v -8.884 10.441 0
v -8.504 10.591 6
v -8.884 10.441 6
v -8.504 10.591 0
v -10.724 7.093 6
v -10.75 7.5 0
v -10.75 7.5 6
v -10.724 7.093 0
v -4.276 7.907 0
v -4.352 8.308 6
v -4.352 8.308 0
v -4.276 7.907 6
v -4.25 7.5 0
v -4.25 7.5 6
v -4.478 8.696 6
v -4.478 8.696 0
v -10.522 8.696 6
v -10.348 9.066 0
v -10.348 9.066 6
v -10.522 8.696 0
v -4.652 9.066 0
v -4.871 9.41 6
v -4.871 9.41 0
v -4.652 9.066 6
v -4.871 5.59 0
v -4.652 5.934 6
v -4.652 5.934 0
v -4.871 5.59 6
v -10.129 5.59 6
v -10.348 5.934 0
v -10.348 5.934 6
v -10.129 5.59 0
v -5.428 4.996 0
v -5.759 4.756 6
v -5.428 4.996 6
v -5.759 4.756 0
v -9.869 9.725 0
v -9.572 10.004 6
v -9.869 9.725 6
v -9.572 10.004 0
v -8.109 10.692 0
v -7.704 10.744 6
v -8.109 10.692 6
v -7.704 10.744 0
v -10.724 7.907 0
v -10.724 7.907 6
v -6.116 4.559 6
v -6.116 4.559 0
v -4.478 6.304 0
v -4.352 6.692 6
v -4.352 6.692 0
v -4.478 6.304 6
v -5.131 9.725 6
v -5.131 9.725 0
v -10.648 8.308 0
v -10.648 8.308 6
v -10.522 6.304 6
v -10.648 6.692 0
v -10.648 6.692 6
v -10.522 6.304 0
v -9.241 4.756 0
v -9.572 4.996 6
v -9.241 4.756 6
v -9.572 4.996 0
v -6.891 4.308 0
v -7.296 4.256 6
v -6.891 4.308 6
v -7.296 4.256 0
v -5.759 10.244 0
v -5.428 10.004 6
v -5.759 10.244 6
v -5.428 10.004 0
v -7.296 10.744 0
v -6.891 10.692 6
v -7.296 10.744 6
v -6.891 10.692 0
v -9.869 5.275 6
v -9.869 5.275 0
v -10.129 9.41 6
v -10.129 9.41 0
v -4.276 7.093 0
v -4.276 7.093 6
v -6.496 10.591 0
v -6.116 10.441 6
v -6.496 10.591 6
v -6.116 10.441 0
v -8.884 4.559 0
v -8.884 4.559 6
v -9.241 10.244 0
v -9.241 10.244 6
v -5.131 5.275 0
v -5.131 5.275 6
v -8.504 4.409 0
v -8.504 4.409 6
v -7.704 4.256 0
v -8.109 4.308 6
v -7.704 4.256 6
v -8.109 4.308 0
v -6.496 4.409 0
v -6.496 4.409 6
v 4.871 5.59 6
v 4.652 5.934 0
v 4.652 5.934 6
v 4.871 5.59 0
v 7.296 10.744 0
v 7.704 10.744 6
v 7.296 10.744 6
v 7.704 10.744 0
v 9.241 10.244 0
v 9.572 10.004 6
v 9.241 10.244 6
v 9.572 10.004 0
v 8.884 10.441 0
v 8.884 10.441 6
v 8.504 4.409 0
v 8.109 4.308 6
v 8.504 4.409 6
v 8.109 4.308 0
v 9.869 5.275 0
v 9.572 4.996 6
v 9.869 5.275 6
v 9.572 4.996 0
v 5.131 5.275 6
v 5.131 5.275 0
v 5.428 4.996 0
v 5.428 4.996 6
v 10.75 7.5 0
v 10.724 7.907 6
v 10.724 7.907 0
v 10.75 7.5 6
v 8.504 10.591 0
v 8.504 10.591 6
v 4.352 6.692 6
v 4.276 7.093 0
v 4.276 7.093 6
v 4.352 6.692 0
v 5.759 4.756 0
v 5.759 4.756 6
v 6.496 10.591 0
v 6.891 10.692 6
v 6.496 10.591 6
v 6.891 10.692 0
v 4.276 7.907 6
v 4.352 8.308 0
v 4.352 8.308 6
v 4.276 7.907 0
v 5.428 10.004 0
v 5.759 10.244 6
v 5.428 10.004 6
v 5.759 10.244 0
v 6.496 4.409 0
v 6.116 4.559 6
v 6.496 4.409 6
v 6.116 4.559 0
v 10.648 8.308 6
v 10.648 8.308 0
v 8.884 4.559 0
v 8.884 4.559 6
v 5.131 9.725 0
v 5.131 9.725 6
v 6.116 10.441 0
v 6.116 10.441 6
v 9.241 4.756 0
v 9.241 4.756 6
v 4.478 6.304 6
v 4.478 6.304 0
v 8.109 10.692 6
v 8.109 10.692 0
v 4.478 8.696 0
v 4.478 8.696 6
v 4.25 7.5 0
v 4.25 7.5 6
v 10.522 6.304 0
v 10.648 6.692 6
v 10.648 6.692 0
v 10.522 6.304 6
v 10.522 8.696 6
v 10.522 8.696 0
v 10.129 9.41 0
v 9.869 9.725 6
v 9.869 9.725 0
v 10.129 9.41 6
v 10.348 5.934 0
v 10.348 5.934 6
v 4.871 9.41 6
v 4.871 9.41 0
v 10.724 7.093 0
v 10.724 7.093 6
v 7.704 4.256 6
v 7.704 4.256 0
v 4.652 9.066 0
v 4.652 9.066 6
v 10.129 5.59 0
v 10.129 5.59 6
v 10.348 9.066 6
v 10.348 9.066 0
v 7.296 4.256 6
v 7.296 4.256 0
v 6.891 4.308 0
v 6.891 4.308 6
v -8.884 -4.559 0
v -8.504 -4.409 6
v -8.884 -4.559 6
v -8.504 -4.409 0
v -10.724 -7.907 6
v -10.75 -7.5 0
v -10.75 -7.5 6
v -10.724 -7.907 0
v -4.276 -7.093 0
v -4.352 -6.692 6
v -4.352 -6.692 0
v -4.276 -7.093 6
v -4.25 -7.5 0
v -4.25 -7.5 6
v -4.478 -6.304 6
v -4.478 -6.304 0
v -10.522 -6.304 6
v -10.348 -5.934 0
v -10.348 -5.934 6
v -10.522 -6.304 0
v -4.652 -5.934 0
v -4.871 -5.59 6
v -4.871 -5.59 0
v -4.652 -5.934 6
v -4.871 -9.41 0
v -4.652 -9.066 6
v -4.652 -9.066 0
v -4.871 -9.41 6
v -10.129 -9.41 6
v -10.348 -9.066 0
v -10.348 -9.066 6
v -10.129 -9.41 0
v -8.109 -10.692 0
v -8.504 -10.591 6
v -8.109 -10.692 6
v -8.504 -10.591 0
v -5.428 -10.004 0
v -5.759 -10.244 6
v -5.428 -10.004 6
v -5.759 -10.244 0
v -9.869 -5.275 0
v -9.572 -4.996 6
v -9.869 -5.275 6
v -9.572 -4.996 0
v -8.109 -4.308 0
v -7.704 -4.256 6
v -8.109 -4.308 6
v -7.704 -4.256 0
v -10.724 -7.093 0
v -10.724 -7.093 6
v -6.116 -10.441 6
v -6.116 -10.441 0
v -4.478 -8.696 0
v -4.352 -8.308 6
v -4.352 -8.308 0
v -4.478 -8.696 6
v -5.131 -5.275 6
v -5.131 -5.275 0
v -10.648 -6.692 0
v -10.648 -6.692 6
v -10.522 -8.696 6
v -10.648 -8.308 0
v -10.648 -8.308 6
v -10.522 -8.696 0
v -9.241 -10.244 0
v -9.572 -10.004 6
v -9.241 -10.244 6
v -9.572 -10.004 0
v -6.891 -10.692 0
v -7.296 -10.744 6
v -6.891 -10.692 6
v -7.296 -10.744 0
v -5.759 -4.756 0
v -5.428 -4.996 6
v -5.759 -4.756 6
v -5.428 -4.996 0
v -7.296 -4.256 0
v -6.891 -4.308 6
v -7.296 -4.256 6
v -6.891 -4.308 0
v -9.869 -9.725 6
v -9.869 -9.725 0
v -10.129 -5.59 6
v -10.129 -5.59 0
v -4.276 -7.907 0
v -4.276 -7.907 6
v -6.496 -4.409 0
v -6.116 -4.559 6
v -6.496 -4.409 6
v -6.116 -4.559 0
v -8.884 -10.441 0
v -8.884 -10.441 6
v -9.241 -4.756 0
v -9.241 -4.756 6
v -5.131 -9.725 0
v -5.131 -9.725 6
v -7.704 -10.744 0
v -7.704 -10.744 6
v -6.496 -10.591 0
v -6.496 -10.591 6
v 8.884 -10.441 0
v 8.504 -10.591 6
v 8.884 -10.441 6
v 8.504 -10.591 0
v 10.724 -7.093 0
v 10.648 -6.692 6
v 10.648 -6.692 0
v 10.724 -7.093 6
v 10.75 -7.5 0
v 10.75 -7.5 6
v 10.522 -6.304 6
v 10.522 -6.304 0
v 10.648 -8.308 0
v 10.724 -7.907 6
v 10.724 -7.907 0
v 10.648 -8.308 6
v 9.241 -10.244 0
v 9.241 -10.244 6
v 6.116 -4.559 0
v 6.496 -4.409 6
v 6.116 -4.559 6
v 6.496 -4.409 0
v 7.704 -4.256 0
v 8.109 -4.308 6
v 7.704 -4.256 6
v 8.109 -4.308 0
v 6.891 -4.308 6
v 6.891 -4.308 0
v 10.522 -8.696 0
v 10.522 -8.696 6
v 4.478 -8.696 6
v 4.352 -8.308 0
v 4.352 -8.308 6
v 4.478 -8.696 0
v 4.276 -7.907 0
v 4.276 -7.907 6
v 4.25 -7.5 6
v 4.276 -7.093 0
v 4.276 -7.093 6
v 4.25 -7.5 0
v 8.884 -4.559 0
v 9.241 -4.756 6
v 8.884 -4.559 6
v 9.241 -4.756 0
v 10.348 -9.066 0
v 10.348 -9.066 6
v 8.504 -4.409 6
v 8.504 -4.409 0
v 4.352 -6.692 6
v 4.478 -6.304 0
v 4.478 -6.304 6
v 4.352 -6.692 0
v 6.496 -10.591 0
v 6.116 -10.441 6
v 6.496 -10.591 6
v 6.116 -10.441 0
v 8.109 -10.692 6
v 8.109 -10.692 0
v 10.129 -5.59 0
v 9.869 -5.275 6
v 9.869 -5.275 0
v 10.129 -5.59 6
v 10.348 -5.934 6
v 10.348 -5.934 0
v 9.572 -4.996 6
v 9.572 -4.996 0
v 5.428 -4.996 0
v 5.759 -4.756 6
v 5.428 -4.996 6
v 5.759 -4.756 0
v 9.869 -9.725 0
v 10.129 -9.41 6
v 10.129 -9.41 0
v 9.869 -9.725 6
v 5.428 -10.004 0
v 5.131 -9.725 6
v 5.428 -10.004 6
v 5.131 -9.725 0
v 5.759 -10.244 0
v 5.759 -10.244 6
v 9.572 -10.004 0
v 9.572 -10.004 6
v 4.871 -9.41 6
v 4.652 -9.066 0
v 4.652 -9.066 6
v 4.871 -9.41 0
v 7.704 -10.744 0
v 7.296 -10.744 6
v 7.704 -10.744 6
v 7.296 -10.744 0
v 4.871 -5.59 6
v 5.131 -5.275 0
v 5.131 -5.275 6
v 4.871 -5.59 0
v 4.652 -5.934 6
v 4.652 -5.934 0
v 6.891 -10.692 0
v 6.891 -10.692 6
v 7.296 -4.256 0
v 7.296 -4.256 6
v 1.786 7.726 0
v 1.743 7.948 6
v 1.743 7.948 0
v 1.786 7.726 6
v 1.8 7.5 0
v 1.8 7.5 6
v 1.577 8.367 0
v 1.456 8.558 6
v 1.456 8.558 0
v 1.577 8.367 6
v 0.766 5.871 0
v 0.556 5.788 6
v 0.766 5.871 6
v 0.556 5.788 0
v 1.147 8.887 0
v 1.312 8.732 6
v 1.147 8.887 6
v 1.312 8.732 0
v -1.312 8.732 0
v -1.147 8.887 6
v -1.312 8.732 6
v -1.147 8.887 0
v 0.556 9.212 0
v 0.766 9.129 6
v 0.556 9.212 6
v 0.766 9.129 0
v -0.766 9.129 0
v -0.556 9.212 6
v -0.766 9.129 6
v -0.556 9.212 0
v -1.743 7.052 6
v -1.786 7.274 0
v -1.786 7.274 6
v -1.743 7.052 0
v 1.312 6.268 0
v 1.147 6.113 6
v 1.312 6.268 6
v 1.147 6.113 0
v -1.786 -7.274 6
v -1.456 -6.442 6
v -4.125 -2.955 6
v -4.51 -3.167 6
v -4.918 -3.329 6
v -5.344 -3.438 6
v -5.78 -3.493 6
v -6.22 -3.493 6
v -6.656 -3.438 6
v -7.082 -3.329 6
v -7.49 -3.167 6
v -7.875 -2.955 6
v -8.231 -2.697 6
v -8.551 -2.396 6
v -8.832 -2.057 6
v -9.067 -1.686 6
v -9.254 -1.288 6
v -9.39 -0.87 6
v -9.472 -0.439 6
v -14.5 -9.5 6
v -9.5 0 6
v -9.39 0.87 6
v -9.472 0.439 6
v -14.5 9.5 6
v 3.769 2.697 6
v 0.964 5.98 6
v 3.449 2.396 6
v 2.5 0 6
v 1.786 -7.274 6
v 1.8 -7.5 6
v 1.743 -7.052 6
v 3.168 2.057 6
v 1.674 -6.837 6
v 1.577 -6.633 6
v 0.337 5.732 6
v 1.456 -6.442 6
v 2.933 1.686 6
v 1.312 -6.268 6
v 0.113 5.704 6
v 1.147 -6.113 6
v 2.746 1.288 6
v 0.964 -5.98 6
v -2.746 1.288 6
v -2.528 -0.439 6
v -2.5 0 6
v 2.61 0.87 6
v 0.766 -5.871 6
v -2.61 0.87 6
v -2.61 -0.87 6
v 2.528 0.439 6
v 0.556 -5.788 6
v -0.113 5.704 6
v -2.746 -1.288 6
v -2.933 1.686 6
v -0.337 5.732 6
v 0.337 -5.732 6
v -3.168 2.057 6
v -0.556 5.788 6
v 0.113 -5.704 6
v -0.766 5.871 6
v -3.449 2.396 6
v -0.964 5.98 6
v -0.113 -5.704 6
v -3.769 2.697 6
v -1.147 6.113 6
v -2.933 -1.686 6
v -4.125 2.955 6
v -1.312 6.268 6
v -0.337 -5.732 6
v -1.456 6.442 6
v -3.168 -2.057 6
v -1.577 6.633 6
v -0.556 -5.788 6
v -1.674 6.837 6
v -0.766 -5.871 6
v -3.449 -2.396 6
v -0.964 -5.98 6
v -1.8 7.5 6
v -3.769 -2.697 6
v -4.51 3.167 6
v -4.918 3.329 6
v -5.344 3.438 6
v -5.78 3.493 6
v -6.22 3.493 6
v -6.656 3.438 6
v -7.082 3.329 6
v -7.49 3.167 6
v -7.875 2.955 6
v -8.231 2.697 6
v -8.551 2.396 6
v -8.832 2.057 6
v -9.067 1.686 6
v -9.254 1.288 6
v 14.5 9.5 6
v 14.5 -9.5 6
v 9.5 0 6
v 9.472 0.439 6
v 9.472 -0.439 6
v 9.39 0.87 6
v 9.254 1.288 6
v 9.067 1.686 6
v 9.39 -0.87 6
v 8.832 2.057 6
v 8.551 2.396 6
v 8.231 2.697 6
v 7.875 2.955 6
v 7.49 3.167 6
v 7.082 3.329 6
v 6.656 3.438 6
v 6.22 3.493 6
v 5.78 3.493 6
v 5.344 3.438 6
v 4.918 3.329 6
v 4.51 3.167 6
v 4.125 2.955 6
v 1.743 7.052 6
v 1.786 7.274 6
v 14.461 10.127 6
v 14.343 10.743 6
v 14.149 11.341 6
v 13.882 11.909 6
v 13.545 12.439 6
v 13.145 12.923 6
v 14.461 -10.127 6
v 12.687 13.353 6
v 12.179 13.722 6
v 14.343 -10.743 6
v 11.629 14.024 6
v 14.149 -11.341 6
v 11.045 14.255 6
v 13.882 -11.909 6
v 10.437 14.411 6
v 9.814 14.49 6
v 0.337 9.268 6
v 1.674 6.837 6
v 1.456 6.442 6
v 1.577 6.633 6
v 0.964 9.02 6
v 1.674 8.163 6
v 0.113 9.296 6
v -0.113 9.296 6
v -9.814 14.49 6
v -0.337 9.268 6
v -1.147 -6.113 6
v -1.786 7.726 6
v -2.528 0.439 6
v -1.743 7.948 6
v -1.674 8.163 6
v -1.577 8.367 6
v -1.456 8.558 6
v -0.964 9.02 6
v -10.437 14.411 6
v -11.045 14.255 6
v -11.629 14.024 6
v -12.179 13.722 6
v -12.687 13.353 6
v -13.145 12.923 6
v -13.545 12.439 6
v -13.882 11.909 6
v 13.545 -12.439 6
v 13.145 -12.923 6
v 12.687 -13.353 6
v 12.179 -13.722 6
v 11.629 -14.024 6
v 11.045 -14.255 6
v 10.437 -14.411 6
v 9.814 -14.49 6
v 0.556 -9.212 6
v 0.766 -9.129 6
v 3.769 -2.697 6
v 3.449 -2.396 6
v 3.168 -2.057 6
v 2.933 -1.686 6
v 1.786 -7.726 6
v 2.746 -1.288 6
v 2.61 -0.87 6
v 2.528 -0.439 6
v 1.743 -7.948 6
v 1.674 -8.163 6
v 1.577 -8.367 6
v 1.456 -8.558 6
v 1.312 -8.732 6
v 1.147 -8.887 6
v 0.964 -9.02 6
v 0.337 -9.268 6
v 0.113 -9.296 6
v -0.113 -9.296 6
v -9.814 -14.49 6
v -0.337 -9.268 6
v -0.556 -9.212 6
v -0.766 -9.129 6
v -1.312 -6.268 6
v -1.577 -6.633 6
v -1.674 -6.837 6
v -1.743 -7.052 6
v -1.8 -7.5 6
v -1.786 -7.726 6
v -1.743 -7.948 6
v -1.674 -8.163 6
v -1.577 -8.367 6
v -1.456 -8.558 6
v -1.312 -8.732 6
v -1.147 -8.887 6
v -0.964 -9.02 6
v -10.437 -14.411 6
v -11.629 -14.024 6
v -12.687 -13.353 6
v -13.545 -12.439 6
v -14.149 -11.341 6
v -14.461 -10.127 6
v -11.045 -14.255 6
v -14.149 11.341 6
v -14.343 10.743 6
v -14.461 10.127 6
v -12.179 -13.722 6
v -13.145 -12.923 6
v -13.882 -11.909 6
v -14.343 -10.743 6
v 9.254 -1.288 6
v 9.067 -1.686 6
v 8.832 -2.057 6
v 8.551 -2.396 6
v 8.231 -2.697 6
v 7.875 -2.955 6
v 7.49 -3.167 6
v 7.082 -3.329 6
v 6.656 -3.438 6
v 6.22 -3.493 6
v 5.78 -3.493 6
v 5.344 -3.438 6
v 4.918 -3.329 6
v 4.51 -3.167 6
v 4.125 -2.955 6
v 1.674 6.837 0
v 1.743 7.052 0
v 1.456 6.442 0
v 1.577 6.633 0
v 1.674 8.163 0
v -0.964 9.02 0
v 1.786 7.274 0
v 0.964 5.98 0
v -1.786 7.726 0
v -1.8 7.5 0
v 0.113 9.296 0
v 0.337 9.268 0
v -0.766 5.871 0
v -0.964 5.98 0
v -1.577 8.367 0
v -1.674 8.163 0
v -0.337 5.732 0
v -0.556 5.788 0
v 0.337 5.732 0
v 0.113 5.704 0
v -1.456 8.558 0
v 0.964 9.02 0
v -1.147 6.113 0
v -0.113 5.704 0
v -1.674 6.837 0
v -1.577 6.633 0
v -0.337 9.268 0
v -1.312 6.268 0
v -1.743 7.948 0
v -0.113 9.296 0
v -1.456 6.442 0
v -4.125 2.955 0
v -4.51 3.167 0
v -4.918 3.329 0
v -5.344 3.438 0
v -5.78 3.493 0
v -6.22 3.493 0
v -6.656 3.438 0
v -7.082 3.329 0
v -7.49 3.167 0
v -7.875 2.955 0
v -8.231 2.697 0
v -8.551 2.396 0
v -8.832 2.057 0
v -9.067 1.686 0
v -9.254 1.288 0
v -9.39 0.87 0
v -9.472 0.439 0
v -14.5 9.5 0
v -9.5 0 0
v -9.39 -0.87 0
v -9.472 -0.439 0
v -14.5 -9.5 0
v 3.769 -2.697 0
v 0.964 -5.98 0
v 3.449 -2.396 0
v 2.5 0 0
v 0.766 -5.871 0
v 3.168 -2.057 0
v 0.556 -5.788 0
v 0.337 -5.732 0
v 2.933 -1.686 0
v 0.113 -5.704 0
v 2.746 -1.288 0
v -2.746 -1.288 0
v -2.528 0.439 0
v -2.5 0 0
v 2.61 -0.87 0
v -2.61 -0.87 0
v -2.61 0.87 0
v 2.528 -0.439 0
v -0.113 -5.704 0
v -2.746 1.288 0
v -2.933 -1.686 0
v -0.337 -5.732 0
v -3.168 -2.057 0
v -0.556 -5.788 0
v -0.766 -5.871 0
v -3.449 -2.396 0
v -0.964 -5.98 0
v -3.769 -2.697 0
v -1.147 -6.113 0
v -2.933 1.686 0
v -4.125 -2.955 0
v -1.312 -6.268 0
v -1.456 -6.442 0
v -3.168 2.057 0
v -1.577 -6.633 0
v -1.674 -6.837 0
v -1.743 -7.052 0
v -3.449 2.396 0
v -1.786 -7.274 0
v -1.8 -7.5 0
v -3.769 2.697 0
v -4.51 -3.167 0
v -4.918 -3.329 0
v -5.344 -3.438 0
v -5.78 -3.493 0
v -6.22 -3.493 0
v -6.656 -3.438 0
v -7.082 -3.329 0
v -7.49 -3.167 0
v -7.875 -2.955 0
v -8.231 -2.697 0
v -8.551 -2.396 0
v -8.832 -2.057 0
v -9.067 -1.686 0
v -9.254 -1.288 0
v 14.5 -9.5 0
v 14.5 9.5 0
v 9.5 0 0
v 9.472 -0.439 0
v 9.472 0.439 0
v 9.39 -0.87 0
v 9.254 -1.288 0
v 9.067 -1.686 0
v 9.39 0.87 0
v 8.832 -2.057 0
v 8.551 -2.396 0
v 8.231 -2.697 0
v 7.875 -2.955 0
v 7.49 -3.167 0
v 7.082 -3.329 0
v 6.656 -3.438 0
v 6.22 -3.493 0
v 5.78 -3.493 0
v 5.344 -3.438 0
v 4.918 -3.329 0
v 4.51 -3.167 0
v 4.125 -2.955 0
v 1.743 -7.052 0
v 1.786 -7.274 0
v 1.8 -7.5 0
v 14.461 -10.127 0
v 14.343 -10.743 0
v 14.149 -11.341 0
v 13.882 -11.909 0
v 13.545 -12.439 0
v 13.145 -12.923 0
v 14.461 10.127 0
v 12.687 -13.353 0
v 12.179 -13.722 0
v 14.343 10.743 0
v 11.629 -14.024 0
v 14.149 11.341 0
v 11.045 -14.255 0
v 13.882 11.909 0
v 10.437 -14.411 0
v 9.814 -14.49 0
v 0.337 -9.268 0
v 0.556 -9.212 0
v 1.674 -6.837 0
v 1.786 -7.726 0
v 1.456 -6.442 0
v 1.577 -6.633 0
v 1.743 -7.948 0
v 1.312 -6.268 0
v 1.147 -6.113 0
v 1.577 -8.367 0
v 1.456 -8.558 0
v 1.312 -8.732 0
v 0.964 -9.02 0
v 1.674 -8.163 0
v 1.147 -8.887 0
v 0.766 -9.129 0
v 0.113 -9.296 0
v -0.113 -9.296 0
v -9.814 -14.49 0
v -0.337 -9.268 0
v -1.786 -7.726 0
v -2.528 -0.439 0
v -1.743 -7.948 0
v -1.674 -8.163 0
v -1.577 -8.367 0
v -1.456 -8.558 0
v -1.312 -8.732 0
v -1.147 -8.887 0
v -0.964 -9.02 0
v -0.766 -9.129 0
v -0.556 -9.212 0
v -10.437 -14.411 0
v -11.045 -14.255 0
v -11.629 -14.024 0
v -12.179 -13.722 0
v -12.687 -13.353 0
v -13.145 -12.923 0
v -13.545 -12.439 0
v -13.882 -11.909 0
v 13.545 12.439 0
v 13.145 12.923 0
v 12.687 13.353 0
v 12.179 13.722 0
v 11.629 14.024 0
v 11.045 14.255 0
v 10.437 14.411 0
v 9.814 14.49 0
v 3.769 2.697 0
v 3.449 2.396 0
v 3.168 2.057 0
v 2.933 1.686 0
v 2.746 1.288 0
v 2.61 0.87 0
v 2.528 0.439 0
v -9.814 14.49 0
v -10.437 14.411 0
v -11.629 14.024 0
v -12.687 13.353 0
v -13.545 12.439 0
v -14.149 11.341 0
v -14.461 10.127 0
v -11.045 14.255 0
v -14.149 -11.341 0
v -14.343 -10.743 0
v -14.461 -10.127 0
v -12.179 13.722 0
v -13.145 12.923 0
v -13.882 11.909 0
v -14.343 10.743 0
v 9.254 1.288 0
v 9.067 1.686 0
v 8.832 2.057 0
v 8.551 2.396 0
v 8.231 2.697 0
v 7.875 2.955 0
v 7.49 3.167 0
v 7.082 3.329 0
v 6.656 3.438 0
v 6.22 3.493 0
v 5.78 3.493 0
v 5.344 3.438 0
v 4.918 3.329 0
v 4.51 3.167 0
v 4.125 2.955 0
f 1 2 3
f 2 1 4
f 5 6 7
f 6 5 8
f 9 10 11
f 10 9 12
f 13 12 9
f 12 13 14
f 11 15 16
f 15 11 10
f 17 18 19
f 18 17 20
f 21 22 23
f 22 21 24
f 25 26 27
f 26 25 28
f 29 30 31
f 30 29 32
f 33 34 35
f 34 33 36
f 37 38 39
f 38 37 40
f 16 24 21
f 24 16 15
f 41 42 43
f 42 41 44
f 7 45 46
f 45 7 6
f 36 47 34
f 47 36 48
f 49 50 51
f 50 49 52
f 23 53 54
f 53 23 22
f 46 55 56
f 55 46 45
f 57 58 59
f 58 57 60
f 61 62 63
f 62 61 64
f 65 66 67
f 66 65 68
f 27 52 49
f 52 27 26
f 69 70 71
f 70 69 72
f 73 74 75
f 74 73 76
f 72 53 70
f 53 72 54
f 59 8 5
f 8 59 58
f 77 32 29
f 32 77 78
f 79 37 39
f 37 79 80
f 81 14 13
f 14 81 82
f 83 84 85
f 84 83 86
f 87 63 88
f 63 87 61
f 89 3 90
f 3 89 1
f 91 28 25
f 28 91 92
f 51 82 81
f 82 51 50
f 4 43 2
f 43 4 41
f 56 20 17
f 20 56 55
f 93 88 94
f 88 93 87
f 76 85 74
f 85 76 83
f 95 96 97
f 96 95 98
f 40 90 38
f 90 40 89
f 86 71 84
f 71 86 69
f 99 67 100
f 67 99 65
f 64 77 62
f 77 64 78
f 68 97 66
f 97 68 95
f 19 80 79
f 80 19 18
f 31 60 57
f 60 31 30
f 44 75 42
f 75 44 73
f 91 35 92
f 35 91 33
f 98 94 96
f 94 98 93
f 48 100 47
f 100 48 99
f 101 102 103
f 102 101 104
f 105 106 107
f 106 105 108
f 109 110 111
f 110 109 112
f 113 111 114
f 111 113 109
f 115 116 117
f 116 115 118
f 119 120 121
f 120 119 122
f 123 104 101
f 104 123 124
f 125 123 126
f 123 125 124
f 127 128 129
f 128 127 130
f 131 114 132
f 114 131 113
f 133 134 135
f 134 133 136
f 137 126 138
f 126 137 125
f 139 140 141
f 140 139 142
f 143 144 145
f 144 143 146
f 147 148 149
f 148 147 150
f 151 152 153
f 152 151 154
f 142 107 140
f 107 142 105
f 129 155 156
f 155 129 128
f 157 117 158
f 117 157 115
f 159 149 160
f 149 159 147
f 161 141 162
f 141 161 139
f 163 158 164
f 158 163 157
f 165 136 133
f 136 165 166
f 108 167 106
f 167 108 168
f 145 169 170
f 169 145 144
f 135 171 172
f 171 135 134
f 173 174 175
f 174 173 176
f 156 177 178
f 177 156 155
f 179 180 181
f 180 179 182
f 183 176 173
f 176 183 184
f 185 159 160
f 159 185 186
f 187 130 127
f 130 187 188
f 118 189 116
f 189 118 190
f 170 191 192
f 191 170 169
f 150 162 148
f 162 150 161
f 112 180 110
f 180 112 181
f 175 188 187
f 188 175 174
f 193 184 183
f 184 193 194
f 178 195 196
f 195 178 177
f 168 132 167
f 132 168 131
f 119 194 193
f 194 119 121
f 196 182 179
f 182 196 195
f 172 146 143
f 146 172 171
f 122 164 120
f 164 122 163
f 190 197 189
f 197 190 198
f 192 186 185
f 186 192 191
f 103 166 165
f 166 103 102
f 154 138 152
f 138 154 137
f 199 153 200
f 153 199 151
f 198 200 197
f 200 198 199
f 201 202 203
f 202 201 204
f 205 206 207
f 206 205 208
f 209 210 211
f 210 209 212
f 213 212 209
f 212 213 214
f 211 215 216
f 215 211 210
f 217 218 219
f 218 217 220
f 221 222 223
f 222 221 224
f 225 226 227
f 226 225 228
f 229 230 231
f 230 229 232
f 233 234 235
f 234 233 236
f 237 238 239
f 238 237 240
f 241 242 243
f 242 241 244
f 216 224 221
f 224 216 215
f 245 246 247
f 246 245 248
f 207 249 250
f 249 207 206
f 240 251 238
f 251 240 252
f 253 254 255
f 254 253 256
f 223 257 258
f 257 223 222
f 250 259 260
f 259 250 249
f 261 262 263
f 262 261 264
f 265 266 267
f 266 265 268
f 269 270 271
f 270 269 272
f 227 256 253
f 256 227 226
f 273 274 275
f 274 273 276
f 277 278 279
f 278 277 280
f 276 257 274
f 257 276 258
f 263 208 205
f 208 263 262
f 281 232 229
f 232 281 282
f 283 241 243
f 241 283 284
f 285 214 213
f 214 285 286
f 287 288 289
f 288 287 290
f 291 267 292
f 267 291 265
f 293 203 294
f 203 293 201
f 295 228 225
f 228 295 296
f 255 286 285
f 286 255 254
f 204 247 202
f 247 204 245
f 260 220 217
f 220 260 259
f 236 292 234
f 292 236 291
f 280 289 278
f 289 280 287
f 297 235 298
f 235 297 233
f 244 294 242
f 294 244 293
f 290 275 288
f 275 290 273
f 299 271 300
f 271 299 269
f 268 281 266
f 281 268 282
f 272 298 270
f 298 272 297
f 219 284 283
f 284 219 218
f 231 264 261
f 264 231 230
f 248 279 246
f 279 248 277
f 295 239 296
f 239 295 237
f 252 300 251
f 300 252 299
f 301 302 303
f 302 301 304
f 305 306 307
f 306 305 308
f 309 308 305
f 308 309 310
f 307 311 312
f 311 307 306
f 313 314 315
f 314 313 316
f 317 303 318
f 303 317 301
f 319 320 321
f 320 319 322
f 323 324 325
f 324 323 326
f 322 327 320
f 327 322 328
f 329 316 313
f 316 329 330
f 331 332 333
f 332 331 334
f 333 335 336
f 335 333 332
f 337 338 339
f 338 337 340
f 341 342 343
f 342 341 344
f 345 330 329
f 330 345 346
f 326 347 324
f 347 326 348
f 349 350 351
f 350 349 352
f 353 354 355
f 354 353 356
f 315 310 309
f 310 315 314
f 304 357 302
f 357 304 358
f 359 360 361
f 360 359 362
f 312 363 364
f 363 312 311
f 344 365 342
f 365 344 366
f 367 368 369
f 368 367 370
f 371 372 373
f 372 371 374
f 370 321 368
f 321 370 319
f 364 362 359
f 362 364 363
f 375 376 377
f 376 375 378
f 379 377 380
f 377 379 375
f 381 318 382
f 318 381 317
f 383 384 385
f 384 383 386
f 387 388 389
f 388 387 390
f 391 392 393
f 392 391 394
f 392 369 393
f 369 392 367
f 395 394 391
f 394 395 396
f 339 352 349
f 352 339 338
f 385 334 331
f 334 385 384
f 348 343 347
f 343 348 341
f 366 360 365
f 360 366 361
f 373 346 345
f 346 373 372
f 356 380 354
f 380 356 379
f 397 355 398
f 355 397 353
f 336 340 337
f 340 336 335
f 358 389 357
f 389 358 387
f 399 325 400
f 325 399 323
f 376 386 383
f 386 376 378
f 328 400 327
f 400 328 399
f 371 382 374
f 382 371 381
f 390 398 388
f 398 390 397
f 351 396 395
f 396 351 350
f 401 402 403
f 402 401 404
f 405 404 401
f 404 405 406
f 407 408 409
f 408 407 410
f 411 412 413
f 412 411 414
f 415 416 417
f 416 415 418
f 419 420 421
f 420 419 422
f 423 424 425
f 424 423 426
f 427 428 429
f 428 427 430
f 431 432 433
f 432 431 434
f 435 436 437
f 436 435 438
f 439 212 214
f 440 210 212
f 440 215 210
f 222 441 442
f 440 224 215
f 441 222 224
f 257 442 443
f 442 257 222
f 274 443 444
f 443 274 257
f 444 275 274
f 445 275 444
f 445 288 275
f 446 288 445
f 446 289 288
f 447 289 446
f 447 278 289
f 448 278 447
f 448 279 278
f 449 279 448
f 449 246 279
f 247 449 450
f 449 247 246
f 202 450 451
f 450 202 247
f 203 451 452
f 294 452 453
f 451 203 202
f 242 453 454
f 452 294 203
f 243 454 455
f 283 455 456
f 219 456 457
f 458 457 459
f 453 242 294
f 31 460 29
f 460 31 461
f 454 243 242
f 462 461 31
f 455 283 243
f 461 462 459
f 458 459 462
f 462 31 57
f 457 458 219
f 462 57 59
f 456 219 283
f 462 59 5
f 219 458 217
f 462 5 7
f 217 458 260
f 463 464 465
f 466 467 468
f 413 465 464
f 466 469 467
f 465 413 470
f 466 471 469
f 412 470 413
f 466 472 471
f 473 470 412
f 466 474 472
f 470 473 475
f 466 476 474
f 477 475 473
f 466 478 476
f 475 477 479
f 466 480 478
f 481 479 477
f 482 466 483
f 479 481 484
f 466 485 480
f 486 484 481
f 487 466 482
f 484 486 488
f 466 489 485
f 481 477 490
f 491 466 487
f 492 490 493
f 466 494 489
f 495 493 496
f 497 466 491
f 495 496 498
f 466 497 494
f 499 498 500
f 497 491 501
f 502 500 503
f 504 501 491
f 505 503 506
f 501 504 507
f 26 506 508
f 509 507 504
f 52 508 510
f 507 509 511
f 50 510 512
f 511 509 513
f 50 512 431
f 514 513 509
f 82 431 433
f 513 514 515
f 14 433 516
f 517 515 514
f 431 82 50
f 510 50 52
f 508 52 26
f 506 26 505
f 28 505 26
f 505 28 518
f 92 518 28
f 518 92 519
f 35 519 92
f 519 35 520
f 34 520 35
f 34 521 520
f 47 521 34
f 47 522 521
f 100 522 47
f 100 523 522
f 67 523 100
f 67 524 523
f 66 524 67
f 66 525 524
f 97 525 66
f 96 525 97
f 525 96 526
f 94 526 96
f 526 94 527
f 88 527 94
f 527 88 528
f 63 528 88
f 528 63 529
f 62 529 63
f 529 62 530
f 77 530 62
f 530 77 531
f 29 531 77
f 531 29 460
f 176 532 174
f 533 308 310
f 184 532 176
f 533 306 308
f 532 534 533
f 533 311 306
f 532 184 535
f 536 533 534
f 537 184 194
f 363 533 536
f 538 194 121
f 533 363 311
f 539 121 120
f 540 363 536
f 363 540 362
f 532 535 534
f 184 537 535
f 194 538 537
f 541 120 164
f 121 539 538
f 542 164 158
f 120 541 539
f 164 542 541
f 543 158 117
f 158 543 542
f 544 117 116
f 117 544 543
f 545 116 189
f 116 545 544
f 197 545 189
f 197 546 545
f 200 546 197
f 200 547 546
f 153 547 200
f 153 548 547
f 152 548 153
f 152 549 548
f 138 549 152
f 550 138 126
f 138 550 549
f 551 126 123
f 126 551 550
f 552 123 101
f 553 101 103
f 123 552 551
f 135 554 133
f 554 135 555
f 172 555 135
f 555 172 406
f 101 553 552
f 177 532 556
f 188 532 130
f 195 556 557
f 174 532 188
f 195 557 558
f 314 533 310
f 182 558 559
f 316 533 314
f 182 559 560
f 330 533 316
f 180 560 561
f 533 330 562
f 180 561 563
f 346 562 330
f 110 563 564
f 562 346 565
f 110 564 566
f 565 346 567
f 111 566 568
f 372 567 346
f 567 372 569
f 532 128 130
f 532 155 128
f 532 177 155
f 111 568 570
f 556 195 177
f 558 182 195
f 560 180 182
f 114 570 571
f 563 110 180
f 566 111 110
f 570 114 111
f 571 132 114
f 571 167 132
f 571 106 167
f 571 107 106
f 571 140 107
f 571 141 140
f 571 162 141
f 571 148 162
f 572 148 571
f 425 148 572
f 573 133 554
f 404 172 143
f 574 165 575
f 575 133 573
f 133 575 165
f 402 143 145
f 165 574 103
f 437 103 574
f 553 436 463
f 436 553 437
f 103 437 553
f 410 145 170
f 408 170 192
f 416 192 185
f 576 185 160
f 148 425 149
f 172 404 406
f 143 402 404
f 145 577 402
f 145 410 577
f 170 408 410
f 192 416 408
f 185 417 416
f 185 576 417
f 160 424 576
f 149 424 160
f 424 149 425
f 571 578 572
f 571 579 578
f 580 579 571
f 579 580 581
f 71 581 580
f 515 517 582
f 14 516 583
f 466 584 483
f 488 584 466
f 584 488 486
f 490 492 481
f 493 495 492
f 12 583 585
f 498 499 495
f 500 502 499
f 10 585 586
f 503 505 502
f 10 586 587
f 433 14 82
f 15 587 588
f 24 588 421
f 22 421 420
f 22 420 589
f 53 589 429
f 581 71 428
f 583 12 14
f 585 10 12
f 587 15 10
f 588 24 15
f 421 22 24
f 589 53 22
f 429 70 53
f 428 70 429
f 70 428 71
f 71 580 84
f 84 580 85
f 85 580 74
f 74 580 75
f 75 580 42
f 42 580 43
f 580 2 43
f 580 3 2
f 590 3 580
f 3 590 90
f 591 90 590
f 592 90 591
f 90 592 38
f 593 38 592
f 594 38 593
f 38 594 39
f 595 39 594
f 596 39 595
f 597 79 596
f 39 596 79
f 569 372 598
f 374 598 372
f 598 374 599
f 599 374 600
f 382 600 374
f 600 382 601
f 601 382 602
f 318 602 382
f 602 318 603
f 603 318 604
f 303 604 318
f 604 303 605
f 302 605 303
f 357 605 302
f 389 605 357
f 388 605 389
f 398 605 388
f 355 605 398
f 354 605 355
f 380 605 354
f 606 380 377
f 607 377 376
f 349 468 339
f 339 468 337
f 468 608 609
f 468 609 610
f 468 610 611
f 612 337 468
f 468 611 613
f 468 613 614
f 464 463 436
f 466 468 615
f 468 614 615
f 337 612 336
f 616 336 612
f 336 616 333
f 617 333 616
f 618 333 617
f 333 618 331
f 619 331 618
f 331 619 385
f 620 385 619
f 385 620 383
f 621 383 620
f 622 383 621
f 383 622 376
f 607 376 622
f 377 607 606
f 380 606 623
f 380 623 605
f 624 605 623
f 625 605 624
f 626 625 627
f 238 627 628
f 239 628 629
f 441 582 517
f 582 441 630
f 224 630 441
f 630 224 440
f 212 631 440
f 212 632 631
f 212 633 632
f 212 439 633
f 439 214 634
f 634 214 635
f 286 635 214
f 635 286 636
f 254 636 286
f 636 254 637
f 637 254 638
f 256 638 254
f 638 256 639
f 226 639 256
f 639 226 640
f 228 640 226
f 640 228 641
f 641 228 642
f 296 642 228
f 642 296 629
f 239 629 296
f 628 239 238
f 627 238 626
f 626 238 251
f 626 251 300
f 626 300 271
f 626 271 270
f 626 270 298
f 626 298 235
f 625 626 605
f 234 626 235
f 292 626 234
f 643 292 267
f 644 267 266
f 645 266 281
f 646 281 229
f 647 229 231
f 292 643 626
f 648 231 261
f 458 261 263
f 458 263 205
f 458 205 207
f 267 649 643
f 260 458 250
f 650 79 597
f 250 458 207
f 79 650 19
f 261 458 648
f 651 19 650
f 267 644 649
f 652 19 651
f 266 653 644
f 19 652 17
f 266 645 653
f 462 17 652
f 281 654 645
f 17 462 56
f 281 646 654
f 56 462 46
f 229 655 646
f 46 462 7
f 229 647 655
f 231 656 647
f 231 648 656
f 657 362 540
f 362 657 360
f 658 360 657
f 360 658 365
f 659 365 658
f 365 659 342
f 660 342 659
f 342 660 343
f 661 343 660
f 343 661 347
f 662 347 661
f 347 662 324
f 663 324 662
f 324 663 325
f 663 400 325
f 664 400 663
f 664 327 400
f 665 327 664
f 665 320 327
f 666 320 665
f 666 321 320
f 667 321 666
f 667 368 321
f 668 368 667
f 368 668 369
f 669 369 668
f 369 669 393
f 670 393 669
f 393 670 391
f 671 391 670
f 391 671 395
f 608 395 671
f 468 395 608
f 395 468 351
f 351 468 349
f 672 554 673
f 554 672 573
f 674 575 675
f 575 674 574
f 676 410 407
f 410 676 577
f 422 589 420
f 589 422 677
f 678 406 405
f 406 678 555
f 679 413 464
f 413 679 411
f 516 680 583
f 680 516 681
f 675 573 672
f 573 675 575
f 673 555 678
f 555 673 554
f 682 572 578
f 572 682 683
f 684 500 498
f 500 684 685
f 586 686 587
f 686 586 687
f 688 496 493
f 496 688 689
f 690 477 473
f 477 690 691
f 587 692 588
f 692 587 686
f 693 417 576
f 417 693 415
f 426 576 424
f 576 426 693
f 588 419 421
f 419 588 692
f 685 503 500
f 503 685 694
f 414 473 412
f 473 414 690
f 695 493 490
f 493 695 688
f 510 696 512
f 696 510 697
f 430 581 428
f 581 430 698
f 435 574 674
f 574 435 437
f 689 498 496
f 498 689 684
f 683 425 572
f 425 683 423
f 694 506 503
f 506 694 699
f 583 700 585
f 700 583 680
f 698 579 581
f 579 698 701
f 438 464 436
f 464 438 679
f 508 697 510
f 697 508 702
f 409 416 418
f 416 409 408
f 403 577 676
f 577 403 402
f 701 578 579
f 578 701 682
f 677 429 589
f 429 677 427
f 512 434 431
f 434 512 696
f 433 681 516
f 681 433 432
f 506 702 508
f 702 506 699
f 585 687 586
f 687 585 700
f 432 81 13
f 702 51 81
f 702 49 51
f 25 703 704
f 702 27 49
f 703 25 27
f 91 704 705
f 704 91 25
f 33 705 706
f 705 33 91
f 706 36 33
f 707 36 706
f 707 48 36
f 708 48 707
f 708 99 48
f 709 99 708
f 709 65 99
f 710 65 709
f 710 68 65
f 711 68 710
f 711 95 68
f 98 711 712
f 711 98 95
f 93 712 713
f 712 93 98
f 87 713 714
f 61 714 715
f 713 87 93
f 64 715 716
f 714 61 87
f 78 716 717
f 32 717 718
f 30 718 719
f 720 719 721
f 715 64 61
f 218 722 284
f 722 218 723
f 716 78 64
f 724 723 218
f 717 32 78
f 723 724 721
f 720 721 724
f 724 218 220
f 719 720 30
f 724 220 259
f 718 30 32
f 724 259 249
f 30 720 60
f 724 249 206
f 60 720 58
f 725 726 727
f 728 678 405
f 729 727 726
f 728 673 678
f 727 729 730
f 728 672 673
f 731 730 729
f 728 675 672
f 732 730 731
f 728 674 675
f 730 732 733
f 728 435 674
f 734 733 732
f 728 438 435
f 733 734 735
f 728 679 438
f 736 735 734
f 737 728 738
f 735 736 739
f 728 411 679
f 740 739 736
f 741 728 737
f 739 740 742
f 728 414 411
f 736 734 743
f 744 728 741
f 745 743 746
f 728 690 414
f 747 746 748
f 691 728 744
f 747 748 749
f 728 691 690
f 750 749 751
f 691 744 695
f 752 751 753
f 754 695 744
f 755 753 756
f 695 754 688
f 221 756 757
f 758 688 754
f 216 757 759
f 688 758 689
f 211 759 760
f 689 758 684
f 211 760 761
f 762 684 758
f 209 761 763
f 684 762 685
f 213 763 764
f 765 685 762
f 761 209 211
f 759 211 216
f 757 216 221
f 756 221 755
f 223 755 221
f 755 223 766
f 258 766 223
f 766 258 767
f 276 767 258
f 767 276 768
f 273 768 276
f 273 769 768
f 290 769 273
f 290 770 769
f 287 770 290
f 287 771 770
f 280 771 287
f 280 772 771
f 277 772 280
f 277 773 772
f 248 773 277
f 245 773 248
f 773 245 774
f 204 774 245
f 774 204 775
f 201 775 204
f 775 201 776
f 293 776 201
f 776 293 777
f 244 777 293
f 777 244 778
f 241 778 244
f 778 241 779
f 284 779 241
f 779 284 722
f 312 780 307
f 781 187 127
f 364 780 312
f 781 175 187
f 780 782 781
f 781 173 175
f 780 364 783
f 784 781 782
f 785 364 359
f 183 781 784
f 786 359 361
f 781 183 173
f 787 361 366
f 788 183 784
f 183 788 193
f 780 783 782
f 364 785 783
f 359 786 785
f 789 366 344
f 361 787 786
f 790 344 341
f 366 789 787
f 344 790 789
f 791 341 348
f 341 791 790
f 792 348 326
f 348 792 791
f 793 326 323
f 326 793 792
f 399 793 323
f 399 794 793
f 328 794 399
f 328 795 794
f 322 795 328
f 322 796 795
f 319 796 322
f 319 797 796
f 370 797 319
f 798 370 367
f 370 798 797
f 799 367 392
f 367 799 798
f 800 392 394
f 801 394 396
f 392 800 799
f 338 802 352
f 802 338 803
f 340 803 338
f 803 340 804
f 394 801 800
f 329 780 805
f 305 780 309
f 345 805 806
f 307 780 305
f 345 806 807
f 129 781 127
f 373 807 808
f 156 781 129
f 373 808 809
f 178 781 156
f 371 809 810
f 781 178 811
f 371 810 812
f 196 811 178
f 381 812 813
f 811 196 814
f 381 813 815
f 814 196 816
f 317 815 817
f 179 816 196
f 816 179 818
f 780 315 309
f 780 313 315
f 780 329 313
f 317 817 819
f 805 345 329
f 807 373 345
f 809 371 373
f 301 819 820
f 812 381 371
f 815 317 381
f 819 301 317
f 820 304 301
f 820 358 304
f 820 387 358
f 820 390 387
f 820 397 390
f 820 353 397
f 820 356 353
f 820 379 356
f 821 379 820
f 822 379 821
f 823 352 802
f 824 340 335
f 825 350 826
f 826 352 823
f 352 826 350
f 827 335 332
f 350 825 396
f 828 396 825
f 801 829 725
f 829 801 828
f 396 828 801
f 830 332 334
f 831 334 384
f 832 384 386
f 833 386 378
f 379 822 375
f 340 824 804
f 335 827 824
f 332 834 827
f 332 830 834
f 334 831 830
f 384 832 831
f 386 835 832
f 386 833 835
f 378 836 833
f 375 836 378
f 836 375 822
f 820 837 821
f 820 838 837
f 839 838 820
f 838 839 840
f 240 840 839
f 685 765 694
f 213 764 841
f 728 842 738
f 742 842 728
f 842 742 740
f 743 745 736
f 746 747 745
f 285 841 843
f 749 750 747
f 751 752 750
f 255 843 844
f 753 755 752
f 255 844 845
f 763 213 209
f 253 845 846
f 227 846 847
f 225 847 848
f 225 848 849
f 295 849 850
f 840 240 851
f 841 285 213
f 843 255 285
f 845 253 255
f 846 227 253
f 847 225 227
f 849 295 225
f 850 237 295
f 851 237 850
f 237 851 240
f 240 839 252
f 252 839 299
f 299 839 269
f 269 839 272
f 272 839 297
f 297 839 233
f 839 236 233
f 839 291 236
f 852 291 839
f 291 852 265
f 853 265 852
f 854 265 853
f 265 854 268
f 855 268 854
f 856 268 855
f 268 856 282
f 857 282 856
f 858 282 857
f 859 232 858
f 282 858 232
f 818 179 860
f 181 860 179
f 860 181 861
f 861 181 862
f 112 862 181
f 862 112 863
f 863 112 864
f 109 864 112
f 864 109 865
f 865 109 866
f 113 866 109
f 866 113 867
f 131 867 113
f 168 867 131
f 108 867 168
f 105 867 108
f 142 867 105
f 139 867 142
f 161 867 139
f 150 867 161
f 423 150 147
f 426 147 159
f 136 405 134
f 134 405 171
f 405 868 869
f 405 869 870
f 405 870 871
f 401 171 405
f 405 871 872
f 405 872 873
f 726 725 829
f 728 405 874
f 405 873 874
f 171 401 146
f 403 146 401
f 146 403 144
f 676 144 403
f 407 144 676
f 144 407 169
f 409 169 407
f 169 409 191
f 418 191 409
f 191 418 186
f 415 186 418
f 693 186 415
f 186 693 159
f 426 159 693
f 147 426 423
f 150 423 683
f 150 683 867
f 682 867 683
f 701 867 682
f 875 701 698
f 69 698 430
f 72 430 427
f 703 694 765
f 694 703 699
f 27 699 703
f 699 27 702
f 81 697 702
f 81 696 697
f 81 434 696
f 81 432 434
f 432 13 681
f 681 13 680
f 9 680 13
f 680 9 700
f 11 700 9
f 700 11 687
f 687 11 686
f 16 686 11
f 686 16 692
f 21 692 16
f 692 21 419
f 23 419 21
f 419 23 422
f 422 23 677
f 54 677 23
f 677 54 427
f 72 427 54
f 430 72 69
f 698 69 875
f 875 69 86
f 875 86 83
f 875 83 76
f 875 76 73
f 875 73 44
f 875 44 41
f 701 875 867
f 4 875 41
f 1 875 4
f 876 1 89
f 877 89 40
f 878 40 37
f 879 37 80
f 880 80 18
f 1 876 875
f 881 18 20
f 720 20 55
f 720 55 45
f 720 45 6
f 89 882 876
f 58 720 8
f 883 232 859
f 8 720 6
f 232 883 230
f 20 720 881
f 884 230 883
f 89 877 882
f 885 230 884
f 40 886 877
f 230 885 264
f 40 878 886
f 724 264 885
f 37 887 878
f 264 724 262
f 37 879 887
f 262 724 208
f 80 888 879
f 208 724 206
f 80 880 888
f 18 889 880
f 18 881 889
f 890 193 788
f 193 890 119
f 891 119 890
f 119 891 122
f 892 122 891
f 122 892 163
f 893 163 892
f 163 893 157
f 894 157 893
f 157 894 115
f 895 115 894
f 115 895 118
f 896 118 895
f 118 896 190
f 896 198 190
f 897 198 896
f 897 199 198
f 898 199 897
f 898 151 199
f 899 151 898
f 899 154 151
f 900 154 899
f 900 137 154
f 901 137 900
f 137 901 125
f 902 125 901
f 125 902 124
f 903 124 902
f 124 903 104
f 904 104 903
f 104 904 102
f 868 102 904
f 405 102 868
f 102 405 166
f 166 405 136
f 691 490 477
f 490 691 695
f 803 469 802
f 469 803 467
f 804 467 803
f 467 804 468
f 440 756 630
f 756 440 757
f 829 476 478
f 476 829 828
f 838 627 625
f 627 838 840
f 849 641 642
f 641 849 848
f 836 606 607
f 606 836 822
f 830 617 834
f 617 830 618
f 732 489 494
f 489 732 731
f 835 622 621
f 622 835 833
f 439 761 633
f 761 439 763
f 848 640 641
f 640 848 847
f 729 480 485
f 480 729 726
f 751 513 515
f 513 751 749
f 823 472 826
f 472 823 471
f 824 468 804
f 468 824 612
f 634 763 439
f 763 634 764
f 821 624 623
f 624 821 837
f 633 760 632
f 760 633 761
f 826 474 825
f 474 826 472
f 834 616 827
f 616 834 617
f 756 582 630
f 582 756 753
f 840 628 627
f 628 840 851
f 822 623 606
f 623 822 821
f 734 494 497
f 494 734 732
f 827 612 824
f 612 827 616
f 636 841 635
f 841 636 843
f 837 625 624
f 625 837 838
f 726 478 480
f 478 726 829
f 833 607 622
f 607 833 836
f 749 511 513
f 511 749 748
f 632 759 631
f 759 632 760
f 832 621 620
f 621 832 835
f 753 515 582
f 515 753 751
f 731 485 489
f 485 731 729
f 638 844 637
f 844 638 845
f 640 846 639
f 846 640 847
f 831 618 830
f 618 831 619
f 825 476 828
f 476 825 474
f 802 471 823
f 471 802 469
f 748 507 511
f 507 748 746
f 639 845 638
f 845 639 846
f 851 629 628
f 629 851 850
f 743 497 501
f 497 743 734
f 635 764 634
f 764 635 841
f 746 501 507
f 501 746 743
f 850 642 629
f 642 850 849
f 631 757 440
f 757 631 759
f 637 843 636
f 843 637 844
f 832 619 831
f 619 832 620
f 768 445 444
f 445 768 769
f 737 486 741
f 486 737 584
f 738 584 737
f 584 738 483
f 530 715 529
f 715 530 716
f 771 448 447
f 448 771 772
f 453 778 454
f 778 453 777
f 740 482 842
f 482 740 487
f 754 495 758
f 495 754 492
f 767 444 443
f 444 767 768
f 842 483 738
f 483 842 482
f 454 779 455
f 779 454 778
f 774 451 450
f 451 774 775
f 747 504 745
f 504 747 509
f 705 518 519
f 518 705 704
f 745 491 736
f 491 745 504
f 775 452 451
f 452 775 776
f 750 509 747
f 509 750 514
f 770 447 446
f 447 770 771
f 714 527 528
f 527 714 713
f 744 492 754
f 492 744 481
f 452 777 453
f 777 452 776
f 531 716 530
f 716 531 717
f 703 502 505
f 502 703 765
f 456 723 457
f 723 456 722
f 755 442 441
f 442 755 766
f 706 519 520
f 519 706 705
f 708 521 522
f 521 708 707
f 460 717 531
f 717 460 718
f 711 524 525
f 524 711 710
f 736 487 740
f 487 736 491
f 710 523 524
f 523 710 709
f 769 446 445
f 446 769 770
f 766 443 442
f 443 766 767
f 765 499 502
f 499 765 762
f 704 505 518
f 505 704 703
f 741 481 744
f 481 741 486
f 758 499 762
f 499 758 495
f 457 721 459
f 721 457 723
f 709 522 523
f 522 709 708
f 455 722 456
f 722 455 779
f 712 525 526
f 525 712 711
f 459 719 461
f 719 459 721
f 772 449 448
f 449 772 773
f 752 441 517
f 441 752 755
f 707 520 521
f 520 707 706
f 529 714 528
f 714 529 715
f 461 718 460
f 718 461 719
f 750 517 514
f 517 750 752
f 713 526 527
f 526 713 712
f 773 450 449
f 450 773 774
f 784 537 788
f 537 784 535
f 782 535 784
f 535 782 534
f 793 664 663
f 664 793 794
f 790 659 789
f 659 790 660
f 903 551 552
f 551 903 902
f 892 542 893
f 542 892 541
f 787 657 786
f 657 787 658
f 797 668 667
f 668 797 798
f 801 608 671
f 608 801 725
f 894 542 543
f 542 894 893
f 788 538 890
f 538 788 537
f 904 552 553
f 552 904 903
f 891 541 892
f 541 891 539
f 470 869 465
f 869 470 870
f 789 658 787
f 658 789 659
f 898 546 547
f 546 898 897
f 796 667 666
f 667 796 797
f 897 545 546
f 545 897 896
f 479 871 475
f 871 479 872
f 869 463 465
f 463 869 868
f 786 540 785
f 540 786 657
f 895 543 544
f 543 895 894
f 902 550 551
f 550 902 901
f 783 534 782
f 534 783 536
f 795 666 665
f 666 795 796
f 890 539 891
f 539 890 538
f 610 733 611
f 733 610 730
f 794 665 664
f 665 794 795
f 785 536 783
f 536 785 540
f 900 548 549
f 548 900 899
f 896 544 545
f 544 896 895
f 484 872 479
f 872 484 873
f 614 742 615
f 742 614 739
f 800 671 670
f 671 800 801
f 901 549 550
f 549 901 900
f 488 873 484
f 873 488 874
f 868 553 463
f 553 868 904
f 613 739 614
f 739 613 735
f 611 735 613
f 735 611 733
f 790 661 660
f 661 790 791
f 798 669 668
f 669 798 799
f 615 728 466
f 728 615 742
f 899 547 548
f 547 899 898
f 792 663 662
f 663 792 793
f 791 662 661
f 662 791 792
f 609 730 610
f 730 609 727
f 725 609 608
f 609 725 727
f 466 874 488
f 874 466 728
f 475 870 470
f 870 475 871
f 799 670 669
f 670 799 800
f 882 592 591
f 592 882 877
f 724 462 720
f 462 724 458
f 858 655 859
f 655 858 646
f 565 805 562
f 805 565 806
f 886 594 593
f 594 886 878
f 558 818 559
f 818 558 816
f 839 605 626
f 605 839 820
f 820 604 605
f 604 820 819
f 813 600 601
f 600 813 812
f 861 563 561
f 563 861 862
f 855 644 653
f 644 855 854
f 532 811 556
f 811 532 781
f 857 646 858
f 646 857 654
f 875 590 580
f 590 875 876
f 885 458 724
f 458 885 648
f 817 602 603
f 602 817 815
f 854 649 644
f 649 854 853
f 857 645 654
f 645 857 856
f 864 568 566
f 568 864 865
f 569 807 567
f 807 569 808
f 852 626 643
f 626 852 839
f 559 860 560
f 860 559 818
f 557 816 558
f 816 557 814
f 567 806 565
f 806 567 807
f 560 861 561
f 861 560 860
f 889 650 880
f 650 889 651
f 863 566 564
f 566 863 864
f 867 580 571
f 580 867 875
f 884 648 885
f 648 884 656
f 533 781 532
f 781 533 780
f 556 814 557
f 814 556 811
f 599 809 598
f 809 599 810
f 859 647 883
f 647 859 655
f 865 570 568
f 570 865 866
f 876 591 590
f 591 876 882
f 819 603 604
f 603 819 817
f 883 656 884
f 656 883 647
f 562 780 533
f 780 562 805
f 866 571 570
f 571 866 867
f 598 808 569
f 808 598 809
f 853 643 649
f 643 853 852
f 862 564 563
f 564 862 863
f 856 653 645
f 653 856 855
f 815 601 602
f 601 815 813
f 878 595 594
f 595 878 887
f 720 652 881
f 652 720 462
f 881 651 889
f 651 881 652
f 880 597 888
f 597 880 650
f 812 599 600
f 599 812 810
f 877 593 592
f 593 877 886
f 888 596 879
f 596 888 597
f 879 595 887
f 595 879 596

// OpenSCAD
$fn = 50;


difference() {
	union() {
		hull() {
			translate(v = [-9.5000000000, 9.5000000000, 0]) {
				cylinder(h = 6, r = 5);
			}
			translate(v = [9.5000000000, 9.5000000000, 0]) {
				cylinder(h = 6, r = 5);
			}
			translate(v = [-9.5000000000, -9.5000000000, 0]) {
				cylinder(h = 6, r = 5);
			}
			translate(v = [9.5000000000, -9.5000000000, 0]) {
				cylinder(h = 6, r = 5);
			}
		}
	}
	union() {
		#translate(v = [-7.5000000000, 7.5000000000, 0]) {
			cylinder(h = 6, r = 3.2500000000);
		}
		#translate(v = [7.5000000000, 7.5000000000, 0]) {
			cylinder(h = 6, r = 3.2500000000);
		}
		#translate(v = [-7.5000000000, -7.5000000000, 0]) {
			cylinder(h = 6, r = 3.2500000000);
		}
		#translate(v = [7.5000000000, -7.5000000000, 0]) {
			cylinder(h = 6, r = 3.2500000000);
		}
		#translate(v = [-7.5000000000, -7.5000000000, -100.0000000000]) {
			cylinder(h = 200, r = 3.2500000000);
		}
		#translate(v = [-7.5000000000, 7.5000000000, -100.0000000000]) {
			cylinder(h = 200, r = 3.2500000000);
		}
		#translate(v = [7.5000000000, -7.5000000000, -100.0000000000]) {
			cylinder(h = 200, r = 3.2500000000);
		}
		#translate(v = [7.5000000000, 7.5000000000, -100.0000000000]) {
			cylinder(h = 200, r = 3.2500000000);
		}
		#translate(v = [-7.5000000000, 7.5000000000, 0]) {
			cylinder(h = 6, r = 1.8000000000);
		}
		#translate(v = [0.0000000000, 7.5000000000, 0]) {
			cylinder(h = 6, r = 1.8000000000);
		}
		#translate(v = [7.5000000000, 7.5000000000, 0]) {
			cylinder(h = 6, r = 1.8000000000);
		}
		#translate(v = [-7.5000000000, -7.5000000000, 0]) {
			cylinder(h = 6, r = 1.8000000000);
		}
		#translate(v = [0.0000000000, -7.5000000000, 0]) {
			cylinder(h = 6, r = 1.8000000000);
		}
		#translate(v = [7.5000000000, -7.5000000000, 0]) {
			cylinder(h = 6, r = 1.8000000000);
		}
		#translate(v = [-7.5000000000, 7.5000000000, 0]) {
			cylinder(h = 6, r = 1.8000000000);
		}
		#translate(v = [0.0000000000, 7.5000000000, 0]) {
			cylinder(h = 6, r = 1.8000000000);
		}
		#translate(v = [7.5000000000, 7.5000000000, 0]) {
			cylinder(h = 6, r = 1.8000000000);
		}
		#translate(v = [-7.5000000000, -7.5000000000, 0]) {
			cylinder(h = 6, r = 1.8000000000);
		}
		#translate(v = [0.0000000000, -7.5000000000, 0]) {
			cylinder(h = 6, r = 1.8000000000);
		}
		#translate(v = [7.5000000000, -7.5000000000, 0]) {
			cylinder(h = 6, r = 1.8000000000);
		}
		#translate(v = [-7.5000000000, 7.5000000000, 0]) {
			cylinder(h = 6, r = 1.8000000000);
		}
		#translate(v = [0.0000000000, 7.5000000000, 0]) {
			cylinder(h = 6, r = 1.8000000000);
		}
		#translate(v = [7.5000000000, 7.5000000000, 0]) {
			cylinder(h = 6, r = 1.8000000000);
		}
		#translate(v = [-7.5000000000, -7.5000000000, 0]) {
			cylinder(h = 6, r = 1.8000000000);
		}
		#translate(v = [0.0000000000, -7.5000000000, 0]) {
			cylinder(h = 6, r = 1.8000000000);
		}
		#translate(v = [7.5000000000, -7.5000000000, 0]) {
			cylinder(h = 6, r = 1.8000000000);
		}
		#translate(v = [-6.0000000000, 0, 0]) {
			cylinder(h = 6, r = 3.5000000000);
		}
		#translate(v = [6.0000000000, 0, 0]) {
			cylinder(h = 6, r = 3.5000000000);
		}
	}
}
